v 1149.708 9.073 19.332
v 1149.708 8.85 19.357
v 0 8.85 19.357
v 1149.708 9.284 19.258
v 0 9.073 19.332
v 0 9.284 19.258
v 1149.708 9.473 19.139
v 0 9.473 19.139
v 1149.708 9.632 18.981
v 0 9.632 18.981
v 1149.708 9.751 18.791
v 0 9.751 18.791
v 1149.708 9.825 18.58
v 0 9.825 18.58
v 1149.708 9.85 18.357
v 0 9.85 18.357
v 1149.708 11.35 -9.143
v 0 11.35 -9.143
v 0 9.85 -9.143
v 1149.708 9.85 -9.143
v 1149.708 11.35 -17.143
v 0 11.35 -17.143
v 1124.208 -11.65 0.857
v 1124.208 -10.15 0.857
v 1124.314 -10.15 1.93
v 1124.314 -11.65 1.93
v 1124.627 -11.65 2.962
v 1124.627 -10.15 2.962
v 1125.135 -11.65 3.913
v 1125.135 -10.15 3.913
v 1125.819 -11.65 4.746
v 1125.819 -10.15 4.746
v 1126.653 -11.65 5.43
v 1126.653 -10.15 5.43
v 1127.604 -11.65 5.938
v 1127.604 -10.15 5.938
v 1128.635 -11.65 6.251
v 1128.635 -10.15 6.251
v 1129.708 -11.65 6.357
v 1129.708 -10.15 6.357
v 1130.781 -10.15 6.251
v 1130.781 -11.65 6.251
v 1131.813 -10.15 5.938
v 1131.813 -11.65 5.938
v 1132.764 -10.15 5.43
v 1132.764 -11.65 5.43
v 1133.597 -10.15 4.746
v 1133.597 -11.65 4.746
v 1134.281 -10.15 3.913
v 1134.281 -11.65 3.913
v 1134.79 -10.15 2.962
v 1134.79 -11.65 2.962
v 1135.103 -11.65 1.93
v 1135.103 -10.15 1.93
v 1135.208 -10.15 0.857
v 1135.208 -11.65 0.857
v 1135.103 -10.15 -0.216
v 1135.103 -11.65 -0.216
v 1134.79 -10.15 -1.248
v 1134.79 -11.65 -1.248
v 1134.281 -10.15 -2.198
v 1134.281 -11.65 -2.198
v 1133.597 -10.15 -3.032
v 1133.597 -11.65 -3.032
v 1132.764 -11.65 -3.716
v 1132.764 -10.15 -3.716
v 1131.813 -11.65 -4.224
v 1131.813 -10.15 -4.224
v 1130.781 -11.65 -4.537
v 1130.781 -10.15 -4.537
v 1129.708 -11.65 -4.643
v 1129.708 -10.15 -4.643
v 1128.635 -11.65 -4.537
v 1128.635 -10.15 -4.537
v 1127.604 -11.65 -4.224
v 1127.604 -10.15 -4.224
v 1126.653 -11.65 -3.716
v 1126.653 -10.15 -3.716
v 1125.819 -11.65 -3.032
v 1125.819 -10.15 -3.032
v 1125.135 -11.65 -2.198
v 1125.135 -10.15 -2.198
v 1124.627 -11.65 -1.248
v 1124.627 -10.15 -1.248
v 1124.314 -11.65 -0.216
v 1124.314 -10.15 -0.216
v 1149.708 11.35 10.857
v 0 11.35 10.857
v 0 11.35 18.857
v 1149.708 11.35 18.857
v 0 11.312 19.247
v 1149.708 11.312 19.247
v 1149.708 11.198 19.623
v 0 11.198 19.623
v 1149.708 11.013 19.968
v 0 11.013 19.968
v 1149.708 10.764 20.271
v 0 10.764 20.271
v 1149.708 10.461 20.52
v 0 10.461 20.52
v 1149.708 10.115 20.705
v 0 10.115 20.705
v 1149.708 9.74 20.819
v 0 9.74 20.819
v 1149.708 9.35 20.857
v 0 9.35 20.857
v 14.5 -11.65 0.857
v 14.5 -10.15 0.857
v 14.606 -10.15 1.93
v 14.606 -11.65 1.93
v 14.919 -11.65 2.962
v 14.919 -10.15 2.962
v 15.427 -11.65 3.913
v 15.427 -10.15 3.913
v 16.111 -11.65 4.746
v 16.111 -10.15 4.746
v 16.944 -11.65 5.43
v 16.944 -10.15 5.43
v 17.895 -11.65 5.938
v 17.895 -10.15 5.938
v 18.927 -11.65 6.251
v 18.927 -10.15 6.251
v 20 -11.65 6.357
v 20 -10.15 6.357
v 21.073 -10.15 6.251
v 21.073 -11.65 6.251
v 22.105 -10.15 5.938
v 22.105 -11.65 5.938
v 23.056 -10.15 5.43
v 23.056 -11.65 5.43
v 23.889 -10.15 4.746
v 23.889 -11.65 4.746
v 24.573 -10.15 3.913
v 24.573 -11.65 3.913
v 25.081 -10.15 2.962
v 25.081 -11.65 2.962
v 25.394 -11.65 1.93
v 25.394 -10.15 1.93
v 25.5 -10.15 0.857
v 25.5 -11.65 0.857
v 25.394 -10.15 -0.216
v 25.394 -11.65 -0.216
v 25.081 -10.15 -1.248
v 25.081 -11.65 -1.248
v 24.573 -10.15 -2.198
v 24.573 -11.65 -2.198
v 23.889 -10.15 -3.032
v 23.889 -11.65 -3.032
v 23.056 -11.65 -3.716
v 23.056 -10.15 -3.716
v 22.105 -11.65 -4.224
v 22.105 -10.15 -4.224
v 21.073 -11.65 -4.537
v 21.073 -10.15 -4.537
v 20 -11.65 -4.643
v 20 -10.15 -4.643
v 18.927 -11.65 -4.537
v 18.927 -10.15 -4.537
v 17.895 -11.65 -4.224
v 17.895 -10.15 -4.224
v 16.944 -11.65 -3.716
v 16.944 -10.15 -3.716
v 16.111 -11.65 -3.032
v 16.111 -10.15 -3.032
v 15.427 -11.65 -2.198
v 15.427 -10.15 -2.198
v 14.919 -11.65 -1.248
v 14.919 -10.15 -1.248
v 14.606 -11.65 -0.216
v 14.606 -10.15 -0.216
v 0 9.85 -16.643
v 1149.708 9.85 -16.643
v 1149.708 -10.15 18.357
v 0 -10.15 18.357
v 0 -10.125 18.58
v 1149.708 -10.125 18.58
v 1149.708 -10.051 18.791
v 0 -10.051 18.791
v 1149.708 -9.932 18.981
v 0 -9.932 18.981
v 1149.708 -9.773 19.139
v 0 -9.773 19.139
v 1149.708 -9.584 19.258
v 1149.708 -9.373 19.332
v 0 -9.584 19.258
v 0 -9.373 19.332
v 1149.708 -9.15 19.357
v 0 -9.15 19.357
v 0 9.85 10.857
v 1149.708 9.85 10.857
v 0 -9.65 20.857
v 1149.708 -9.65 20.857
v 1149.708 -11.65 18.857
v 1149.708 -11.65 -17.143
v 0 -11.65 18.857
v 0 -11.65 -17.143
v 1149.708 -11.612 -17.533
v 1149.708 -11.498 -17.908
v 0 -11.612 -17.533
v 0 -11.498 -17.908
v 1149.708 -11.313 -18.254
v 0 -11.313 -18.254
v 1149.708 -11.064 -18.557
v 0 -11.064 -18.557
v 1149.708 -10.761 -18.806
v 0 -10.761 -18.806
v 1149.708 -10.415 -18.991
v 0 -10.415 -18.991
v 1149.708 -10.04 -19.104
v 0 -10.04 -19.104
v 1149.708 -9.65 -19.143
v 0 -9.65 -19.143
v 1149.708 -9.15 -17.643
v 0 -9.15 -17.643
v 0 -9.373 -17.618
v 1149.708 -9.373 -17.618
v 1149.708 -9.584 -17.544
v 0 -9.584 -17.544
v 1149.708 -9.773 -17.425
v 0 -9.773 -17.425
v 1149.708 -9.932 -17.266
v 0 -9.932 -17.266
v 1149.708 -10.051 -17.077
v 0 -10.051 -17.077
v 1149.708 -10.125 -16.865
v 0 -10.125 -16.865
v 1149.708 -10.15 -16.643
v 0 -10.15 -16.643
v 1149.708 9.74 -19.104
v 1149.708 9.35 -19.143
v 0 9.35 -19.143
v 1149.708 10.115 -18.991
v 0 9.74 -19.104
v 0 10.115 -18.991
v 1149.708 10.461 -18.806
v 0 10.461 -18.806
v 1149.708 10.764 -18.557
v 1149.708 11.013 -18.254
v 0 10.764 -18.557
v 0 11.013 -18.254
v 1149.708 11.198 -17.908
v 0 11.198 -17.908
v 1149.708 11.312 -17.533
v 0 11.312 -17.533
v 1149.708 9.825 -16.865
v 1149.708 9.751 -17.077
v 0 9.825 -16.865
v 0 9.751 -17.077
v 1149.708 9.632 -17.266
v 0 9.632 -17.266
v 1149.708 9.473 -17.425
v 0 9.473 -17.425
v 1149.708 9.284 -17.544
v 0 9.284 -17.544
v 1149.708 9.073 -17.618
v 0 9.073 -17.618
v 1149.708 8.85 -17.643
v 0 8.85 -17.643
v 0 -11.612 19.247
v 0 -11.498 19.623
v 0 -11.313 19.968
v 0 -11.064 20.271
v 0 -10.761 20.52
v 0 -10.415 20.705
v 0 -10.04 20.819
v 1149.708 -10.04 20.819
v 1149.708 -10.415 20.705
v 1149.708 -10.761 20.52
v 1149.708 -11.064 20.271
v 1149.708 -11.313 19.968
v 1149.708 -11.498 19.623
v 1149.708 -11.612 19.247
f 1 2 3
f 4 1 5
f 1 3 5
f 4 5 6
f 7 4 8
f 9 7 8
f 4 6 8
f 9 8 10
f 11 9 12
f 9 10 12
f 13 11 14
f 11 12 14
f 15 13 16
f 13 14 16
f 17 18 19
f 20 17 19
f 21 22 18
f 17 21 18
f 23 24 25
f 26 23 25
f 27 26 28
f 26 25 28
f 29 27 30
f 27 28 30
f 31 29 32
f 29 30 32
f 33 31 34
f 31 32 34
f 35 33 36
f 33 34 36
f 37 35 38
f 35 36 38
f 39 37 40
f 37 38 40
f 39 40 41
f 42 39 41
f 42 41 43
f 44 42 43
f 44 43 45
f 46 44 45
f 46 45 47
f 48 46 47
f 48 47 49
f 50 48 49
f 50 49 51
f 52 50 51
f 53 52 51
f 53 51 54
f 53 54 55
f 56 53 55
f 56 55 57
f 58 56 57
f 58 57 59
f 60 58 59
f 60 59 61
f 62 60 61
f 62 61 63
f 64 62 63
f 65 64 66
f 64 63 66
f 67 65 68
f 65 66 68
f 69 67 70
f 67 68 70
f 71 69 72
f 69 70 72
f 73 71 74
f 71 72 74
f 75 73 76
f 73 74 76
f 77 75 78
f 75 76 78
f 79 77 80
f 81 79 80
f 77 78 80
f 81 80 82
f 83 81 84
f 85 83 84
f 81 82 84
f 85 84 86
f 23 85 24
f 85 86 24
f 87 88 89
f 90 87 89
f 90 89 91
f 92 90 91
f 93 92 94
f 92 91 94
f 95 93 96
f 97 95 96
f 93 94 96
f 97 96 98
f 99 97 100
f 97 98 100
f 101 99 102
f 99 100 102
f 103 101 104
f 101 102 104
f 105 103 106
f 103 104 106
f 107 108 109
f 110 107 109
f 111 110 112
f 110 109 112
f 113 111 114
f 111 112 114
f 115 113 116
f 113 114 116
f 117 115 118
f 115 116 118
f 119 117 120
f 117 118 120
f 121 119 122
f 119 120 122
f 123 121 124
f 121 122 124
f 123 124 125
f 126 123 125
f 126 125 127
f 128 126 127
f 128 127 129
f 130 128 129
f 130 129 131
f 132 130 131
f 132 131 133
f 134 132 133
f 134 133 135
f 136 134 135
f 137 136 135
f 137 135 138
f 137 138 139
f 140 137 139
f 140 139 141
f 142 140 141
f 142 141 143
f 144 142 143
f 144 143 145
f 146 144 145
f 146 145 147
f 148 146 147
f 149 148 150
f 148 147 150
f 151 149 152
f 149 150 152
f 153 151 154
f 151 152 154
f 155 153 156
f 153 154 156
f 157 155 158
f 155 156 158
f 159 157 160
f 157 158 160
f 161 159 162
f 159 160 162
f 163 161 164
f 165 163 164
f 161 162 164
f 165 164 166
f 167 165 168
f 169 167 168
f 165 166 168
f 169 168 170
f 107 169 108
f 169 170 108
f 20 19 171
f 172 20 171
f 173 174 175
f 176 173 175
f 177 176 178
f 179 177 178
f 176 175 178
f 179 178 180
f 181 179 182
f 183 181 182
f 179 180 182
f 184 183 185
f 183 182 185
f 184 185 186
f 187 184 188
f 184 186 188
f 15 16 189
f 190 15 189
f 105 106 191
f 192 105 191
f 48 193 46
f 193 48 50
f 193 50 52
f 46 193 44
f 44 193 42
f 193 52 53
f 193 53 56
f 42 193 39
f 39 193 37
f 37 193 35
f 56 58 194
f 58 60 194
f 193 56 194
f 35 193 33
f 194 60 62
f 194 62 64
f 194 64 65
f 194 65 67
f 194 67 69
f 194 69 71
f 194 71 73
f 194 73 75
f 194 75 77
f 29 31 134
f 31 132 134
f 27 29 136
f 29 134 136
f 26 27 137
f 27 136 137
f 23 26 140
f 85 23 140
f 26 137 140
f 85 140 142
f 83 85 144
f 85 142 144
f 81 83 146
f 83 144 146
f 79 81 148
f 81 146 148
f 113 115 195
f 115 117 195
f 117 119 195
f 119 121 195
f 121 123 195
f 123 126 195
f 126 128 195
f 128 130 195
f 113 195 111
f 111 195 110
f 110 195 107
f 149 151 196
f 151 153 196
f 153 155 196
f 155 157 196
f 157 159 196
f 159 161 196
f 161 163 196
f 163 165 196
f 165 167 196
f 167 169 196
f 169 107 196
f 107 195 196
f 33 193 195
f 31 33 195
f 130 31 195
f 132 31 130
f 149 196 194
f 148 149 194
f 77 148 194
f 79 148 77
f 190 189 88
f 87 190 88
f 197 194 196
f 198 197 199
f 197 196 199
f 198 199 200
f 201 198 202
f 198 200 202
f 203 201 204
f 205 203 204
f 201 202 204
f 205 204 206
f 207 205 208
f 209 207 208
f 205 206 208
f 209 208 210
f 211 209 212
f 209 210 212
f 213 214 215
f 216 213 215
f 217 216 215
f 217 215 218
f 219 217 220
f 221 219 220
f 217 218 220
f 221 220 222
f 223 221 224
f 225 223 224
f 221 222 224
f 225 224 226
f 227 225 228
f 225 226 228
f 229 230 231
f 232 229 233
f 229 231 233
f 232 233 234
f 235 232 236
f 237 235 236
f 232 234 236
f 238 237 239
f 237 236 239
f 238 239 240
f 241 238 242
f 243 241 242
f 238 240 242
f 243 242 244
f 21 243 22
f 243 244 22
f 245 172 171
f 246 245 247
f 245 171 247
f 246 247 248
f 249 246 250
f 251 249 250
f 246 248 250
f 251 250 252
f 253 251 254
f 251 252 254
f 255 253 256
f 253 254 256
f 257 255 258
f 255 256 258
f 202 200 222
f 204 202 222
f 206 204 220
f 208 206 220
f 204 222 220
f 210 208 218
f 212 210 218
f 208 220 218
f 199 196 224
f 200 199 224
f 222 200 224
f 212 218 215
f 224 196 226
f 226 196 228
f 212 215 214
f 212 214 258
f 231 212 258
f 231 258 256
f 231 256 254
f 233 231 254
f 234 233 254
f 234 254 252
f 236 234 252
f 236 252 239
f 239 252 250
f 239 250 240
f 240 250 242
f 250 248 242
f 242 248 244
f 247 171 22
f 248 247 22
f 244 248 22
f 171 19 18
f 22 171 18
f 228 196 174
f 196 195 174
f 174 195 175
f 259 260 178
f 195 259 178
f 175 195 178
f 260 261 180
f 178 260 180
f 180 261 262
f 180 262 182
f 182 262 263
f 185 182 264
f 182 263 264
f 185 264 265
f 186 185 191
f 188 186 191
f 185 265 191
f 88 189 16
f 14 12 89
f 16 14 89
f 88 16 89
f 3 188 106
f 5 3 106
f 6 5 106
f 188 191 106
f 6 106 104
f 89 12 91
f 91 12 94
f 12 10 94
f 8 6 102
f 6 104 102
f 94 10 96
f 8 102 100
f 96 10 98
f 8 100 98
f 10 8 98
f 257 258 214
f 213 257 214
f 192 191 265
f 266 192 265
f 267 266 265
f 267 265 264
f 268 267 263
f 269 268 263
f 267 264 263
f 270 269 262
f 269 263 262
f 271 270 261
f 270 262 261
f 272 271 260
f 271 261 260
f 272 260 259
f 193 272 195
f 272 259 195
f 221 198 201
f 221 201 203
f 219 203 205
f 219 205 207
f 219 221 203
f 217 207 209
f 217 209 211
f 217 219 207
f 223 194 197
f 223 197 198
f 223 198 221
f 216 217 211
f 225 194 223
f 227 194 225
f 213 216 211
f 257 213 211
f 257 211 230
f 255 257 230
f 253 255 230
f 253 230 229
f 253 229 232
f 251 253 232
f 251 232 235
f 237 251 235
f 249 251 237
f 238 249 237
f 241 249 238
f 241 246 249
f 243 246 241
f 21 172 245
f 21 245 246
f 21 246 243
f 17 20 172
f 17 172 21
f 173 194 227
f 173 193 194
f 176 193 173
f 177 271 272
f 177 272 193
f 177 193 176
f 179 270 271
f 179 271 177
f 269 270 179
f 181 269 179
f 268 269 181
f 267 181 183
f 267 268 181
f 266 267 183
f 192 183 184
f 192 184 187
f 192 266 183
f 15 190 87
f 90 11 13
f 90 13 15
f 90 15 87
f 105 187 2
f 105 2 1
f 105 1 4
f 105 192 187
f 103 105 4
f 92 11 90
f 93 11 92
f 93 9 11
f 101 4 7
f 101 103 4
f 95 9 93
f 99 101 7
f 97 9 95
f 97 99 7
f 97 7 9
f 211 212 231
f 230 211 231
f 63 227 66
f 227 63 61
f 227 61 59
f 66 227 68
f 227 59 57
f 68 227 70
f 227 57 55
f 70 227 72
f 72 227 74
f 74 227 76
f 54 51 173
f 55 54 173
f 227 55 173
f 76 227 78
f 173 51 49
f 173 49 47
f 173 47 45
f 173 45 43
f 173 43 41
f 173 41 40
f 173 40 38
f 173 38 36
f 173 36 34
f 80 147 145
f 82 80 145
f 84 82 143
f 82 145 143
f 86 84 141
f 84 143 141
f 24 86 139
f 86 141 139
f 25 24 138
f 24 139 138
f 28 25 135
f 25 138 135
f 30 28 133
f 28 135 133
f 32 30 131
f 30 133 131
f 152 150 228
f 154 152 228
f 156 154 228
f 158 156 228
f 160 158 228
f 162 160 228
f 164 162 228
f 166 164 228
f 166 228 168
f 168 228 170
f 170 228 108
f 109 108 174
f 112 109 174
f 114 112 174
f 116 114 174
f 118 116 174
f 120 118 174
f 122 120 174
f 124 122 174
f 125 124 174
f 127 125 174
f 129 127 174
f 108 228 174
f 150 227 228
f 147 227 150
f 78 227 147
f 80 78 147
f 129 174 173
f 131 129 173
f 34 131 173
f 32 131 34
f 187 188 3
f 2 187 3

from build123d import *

# Parameters (mm, degrees)
F1_DEPTH = 1149.7084
F3_D     = 11


with BuildPart() as f1:
    # F0 (on Right) → F1 (new body)
    with BuildSketch(Plane.YZ):
        with BuildLine():
            ThreePointArc((11.35, 18.857143), (10.764214, 20.271356), (9.35, 20.857143))
            Line((9.35, 20.857143), (-9.65, 20.857143))
            ThreePointArc((-9.65, 20.857143), (-11.064214, 20.271356), (-11.65, 18.857143))
            Line((-11.65, 18.857143), (-11.65, -17.142857))
            ThreePointArc((-11.65, -17.142857), (-11.064214, -18.557071), (-9.65, -19.142857))
            Line((-9.65, -19.142857), (9.35, -19.142857))
            ThreePointArc((9.35, -19.142857), (10.764214, -18.557071), (11.35, -17.142857))
            Line((11.35, -17.142857), (11.35, -9.142857))
            Line((11.35, -9.142857), (9.85, -9.142857))
            Line((9.85, -9.142857), (9.85, -16.642857))
            ThreePointArc((9.85, -16.642857), (9.557107, -17.349964), (8.85, -17.642857))
            Line((8.85, -17.642857), (-9.15, -17.642857))
            ThreePointArc((-9.15, -17.642857), (-9.857107, -17.349964), (-10.15, -16.642857))
            Line((-10.15, -16.642857), (-10.15, 18.357143))
            ThreePointArc((-10.15, 18.357143), (-9.857107, 19.06425), (-9.15, 19.357143))
            Line((-9.15, 19.357143), (8.85, 19.357143))
            ThreePointArc((8.85, 19.357143), (9.557107, 19.06425), (9.85, 18.357143))
            Line((9.85, 18.357143), (9.85, 10.857143))
            Line((9.85, 10.857143), (11.35, 10.857143))
            Line((11.35, 10.857143), (11.35, 18.857143))
        make_face()
    extrude(amount=F1_DEPTH)

    # F3 (through all)
    with Locations(Plane.XZ.offset(11.65)):
        with Locations((20, 0.857143), (1129.7084, 0.857143)):
            Hole(F3_D / 2)


solid = f1.part
